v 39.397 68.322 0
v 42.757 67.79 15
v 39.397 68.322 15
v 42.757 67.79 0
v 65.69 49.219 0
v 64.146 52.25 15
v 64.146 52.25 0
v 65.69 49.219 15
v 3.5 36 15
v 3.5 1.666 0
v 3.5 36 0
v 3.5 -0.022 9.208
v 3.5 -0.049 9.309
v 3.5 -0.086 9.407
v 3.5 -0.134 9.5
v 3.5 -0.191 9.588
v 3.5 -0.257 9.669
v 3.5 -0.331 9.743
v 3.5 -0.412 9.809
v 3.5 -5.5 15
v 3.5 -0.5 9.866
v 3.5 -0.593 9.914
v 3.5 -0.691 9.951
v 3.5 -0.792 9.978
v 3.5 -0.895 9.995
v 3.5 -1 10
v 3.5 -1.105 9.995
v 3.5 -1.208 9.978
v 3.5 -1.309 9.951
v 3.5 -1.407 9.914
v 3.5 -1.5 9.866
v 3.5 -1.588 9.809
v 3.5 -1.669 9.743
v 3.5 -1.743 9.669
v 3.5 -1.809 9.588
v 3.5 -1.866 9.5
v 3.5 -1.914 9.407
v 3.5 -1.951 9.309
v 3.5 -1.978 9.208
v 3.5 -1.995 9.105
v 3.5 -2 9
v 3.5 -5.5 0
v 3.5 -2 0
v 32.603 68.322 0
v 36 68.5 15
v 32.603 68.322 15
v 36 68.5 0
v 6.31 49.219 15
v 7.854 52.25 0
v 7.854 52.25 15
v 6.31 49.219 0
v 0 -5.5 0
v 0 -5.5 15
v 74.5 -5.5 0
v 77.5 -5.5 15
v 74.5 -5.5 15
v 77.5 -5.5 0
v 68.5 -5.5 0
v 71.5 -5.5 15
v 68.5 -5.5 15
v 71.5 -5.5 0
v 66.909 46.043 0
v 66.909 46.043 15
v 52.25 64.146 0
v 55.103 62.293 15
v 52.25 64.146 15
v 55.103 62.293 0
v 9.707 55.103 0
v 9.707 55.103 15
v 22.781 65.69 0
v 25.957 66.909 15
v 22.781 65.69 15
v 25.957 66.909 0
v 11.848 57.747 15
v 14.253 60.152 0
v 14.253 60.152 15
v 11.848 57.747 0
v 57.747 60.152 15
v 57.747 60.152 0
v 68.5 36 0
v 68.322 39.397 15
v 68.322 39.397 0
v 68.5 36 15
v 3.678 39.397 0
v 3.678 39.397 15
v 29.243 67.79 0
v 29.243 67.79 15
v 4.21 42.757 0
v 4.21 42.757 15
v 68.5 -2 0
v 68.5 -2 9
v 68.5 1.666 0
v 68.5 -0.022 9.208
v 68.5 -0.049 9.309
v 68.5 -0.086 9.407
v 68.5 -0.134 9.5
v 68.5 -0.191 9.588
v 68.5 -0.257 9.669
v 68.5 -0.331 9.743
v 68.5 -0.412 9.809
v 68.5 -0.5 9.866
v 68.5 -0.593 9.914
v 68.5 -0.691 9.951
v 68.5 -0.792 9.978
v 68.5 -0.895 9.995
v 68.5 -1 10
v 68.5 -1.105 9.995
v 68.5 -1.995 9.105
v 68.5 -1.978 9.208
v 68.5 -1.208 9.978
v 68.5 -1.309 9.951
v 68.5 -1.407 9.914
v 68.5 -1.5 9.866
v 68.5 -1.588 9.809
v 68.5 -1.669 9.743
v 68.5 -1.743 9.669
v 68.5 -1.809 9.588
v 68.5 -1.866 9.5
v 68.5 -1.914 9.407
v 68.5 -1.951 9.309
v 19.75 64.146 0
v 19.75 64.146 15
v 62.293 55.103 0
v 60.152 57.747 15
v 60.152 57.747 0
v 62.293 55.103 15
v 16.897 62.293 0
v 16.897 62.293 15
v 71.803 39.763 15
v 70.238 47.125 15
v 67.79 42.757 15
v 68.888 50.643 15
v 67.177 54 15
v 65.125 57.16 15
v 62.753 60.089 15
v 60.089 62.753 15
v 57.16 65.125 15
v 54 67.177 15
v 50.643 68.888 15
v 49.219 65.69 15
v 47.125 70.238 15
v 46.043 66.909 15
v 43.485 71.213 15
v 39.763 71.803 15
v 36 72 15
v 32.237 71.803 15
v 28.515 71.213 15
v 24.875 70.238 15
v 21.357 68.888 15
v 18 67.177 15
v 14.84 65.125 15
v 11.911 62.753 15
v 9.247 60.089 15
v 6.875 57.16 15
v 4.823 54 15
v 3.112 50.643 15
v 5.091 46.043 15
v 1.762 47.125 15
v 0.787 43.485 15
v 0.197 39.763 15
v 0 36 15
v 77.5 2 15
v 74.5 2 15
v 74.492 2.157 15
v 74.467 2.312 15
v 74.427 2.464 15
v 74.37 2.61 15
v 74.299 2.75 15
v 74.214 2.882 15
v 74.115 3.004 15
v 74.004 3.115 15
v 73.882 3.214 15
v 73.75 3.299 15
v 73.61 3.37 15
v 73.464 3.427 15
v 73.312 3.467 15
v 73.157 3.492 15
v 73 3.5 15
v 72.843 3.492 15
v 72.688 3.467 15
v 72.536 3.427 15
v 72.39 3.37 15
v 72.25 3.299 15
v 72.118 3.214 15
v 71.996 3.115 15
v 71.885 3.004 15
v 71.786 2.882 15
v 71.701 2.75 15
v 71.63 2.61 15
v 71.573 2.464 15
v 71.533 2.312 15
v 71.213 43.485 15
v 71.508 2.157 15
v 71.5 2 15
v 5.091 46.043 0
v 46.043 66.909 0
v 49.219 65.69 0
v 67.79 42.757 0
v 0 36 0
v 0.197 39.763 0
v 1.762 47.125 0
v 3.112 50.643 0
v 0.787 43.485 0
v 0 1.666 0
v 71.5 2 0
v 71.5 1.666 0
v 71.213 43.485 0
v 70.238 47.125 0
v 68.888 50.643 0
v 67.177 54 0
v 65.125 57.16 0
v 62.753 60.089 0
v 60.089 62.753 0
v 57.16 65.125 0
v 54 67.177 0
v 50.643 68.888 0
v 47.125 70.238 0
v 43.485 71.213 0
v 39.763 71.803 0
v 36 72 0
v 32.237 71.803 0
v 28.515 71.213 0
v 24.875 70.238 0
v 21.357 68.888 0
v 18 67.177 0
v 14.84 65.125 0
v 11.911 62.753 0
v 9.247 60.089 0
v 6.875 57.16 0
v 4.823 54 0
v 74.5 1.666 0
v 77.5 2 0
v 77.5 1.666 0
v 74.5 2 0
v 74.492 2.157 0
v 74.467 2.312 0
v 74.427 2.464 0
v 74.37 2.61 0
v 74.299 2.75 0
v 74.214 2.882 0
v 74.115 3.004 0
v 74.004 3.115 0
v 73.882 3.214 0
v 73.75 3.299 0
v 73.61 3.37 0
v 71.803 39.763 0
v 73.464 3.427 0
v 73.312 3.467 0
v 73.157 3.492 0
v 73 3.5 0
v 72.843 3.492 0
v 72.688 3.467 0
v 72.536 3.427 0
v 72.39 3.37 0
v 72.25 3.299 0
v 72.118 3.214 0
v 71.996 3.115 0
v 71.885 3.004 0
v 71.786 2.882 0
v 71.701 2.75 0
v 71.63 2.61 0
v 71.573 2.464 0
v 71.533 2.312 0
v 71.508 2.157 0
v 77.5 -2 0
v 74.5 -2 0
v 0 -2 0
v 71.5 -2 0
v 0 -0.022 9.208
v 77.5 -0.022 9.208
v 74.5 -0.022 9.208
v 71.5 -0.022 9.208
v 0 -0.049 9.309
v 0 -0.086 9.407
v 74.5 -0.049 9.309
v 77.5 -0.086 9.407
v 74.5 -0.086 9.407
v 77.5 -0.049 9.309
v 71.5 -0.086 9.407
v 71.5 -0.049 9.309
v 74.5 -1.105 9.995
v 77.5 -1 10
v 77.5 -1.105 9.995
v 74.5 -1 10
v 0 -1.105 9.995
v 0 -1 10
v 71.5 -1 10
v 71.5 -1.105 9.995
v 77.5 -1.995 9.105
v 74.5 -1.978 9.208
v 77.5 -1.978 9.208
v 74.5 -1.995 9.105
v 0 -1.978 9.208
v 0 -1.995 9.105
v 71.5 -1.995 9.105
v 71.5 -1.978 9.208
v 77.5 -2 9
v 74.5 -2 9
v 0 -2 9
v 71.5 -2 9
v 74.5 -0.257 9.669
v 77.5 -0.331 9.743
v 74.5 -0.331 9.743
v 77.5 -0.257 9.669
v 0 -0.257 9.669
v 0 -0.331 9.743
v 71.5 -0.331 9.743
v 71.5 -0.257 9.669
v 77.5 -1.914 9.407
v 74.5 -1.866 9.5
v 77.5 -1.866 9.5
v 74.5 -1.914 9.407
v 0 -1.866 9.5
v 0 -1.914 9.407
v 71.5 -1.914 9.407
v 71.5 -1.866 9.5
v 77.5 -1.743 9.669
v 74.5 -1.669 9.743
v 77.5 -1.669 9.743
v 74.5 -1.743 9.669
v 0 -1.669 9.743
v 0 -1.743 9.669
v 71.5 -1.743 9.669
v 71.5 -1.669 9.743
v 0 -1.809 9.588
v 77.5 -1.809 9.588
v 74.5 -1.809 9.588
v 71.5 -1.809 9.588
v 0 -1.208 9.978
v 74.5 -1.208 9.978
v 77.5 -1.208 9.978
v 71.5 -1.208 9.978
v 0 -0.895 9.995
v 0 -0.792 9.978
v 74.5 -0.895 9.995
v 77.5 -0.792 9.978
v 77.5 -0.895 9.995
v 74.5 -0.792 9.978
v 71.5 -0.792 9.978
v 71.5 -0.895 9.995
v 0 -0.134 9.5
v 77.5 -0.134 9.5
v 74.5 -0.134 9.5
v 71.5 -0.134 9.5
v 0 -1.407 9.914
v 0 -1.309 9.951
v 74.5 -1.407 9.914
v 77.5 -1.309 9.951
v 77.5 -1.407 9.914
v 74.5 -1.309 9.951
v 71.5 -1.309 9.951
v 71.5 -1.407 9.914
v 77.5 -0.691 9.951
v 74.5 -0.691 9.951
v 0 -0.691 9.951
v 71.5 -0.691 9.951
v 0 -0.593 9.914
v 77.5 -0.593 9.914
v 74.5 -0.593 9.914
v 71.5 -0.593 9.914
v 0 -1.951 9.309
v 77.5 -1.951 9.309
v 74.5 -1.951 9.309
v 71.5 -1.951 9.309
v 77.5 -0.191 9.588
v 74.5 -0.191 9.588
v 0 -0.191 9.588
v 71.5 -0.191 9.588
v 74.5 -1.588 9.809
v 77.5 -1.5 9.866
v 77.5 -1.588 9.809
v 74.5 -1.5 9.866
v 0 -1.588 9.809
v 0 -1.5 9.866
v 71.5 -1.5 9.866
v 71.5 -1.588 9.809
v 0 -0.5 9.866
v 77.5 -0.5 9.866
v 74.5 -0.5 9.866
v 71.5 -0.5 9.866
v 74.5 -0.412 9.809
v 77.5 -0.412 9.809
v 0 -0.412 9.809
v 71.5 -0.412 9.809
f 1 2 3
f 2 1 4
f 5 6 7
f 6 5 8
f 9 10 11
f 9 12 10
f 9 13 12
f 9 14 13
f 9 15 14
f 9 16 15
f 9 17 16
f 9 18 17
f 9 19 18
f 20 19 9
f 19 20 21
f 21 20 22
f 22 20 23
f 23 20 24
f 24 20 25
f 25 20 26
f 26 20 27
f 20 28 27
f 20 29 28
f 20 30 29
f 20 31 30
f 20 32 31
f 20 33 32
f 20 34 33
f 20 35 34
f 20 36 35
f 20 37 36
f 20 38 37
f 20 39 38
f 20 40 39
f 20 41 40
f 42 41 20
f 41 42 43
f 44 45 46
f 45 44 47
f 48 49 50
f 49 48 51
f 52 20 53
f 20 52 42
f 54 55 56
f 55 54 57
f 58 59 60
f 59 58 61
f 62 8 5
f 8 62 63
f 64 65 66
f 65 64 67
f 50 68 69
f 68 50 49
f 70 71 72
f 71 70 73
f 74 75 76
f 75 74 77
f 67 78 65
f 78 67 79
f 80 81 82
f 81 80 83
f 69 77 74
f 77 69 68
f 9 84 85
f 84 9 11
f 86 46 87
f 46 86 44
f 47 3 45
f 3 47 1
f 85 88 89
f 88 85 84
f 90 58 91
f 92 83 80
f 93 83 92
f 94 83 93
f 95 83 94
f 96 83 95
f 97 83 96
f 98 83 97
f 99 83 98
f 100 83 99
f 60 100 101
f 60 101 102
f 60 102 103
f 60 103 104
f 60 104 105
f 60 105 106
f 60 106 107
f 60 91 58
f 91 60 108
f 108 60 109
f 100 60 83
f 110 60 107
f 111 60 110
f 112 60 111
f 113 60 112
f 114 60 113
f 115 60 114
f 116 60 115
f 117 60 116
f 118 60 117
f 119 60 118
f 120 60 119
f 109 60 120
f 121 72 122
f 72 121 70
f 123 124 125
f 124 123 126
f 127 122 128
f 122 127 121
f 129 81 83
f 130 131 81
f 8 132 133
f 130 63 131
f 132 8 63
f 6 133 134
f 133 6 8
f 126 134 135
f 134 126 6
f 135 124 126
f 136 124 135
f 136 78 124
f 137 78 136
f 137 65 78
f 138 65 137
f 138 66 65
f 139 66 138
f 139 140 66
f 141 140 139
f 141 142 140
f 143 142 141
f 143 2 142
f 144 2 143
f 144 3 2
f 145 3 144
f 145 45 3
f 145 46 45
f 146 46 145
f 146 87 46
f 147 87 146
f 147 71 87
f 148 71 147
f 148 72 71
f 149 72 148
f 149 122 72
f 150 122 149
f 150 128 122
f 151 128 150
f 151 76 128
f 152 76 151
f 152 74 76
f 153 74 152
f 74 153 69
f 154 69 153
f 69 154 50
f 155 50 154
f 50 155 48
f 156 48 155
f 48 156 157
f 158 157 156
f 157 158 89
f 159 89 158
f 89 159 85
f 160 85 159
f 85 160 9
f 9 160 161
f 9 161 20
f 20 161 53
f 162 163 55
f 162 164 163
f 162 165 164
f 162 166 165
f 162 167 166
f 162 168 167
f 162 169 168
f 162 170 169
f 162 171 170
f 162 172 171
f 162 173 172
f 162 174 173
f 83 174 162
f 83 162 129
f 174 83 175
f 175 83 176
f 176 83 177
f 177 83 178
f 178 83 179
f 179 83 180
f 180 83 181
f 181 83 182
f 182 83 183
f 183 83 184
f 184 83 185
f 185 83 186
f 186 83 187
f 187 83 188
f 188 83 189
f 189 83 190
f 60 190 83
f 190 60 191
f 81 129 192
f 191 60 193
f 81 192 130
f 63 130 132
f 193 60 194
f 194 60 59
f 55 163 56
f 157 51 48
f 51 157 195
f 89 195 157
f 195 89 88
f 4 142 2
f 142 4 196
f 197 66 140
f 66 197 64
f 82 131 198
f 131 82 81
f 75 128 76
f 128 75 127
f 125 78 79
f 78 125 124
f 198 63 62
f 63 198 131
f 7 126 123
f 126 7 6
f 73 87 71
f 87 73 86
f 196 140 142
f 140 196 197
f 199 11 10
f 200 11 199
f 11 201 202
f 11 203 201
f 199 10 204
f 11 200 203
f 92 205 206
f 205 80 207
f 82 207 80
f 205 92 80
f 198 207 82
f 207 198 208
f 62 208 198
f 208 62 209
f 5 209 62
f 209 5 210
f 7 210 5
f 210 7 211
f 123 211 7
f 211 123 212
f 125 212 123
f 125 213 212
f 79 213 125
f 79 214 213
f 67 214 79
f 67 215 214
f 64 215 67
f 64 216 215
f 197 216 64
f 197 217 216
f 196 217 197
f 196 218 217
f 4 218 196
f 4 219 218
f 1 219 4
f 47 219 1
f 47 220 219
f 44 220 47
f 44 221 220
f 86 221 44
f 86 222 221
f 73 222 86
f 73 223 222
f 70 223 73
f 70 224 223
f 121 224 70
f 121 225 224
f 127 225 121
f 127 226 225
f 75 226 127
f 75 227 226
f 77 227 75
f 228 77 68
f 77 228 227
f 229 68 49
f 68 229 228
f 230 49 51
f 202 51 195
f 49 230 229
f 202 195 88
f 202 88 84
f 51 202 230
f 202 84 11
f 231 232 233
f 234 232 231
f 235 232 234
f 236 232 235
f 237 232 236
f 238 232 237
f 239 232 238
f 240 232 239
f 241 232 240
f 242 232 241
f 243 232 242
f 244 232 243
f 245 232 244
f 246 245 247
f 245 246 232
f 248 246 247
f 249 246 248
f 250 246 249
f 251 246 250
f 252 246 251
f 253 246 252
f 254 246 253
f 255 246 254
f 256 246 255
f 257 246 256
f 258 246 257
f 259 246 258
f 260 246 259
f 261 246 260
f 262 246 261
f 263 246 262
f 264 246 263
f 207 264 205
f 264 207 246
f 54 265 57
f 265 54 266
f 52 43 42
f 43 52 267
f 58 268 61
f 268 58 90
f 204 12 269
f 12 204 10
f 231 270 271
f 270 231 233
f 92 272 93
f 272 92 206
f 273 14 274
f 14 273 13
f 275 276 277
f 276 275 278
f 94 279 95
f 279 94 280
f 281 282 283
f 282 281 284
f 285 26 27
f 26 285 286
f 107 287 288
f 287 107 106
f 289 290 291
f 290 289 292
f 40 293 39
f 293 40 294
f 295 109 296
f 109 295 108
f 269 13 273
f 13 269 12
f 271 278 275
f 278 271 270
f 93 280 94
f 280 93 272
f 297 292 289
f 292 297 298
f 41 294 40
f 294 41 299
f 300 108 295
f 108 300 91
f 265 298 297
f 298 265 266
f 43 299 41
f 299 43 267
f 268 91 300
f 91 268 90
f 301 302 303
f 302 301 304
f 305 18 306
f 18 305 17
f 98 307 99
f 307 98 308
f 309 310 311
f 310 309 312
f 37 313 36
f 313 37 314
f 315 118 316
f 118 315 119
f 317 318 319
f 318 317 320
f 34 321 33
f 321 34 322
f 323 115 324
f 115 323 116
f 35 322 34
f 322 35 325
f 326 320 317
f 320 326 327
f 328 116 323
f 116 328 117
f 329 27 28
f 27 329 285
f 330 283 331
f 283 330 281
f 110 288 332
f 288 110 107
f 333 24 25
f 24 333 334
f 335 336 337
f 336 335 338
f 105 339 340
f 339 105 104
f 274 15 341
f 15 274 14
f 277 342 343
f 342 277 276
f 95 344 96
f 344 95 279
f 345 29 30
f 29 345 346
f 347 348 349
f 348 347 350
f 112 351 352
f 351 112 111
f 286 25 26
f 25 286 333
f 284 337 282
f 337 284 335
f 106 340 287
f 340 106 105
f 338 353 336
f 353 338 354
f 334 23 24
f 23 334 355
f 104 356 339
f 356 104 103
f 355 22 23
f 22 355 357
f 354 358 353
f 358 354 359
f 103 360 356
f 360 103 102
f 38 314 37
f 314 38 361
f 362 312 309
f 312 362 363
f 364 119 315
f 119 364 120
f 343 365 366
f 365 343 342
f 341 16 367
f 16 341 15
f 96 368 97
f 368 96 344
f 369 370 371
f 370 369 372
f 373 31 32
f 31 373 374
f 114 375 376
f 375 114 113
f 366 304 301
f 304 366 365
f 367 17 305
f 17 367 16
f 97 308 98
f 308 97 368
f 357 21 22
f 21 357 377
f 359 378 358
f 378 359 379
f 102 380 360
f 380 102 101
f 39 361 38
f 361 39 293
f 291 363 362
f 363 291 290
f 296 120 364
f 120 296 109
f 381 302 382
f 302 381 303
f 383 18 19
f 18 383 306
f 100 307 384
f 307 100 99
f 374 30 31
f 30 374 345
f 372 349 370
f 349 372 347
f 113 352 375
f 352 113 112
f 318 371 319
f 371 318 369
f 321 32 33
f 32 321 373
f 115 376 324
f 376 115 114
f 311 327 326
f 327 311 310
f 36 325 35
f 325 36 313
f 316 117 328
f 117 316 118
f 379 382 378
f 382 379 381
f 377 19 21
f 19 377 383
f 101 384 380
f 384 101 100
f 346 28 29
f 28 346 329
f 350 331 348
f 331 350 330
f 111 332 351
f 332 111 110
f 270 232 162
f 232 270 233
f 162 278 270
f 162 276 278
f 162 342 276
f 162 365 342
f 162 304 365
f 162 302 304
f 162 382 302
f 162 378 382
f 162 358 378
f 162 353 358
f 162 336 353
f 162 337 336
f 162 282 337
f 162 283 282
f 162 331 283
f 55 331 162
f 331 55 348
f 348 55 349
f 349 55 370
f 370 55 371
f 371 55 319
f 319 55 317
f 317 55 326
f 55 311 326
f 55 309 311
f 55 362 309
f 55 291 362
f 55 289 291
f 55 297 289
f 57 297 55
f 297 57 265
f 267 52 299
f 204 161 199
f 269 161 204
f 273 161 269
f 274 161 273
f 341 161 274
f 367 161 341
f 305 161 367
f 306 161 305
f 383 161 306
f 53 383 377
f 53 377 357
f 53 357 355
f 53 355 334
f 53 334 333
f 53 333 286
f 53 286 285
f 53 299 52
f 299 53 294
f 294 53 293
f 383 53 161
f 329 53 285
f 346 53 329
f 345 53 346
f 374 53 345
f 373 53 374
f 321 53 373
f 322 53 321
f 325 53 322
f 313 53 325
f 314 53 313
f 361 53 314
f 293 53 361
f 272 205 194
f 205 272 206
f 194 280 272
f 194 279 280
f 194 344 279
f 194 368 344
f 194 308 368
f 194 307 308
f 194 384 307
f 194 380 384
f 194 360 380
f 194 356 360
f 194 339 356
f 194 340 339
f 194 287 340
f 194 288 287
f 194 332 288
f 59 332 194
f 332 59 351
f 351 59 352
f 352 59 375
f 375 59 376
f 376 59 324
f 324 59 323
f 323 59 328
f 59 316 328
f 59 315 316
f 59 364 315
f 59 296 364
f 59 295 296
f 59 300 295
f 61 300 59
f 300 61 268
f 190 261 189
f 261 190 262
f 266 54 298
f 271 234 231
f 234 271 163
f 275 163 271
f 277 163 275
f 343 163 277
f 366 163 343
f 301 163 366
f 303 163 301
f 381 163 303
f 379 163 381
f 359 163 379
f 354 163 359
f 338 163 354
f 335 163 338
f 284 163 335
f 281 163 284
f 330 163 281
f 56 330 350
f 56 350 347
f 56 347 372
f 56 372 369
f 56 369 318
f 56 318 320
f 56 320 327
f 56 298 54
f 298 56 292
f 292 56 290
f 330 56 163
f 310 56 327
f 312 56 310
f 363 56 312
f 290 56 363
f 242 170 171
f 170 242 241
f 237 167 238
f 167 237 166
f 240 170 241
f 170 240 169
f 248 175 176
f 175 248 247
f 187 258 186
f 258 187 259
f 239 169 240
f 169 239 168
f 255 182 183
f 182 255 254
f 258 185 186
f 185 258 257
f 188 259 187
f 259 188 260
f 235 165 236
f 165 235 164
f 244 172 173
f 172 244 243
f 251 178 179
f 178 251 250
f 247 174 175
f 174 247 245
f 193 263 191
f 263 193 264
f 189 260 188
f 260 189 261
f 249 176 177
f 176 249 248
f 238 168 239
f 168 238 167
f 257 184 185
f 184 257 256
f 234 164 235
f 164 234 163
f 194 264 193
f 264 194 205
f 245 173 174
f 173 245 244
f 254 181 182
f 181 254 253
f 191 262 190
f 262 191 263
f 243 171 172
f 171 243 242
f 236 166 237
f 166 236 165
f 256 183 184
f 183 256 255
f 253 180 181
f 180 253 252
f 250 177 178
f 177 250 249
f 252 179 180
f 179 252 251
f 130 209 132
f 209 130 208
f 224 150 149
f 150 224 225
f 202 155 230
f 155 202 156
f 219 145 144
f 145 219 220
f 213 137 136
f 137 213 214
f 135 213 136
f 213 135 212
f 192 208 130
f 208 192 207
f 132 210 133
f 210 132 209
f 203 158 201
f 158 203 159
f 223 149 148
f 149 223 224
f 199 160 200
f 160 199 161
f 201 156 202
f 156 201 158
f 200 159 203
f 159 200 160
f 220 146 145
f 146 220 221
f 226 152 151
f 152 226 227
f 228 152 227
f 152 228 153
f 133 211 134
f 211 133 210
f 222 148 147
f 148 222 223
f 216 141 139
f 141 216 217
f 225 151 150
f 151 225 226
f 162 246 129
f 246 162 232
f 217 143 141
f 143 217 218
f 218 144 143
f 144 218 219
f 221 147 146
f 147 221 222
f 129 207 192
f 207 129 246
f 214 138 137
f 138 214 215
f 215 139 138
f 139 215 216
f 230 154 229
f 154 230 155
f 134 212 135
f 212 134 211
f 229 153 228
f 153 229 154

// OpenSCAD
// [CZ]  Nahradni uchyt napajecky pro morcata
// [ENG] Replacement handle for guinea pigs


bottle  = 65.0;     // bottle diameter
gap     = -0.5;      // bottle distance from the cage
wire    = 2.0;      //wire diameter from the cage
height  = 15.0;     //height of the handle (gap mesh wire)
wall    = 3.5;      //the width of the wall of the handle
$fn     = 60;       //smoothness of the circle 



// varianta s vertikalni fixaci
module holder_v2()
{
    difference()
    {
        union()
        {
            hull()
            { 
                translate([((bottle/2)+(wall)),((bottle/2)+wall),0]) cylinder(d=(bottle+(2*wall)),h=height);
                translate([0,-(wire+wall),0]) cube([(bottle+(3*wall)+wire),(2*wire+wall),height]);
            }
        }
        union()
        {
            hull()
            { 
                translate([((bottle/2)+wall),((bottle/2)+wall),0]) cylinder(d=bottle,h=height);
                translate([wall,-(wire+wall),0]) cube([bottle,(wire+wall),height]);
            }
            hull()
            {
                translate([0,-(wire/2),(height*0.6)]) rotate([0,90,0]) cylinder(d=wire,h=(bottle+(3*wall)+wire));
                translate([0,-0,-wire]) rotate([0,90,0]) cylinder(d=(wire*2),h=(bottle+(3*wall)+wire));
            }
            hull()
            {
                translate([(bottle+(2*wall)+(wire/2)),-((wire)+wall),0]) cylinder(d=(wire*1.5),h=height);
                translate([(bottle+(2*wall)+(wire/2)),((wire)),0]) cylinder(d=(wire*1.5),h=height);
            }
        }
    }

}


holder_v2();
